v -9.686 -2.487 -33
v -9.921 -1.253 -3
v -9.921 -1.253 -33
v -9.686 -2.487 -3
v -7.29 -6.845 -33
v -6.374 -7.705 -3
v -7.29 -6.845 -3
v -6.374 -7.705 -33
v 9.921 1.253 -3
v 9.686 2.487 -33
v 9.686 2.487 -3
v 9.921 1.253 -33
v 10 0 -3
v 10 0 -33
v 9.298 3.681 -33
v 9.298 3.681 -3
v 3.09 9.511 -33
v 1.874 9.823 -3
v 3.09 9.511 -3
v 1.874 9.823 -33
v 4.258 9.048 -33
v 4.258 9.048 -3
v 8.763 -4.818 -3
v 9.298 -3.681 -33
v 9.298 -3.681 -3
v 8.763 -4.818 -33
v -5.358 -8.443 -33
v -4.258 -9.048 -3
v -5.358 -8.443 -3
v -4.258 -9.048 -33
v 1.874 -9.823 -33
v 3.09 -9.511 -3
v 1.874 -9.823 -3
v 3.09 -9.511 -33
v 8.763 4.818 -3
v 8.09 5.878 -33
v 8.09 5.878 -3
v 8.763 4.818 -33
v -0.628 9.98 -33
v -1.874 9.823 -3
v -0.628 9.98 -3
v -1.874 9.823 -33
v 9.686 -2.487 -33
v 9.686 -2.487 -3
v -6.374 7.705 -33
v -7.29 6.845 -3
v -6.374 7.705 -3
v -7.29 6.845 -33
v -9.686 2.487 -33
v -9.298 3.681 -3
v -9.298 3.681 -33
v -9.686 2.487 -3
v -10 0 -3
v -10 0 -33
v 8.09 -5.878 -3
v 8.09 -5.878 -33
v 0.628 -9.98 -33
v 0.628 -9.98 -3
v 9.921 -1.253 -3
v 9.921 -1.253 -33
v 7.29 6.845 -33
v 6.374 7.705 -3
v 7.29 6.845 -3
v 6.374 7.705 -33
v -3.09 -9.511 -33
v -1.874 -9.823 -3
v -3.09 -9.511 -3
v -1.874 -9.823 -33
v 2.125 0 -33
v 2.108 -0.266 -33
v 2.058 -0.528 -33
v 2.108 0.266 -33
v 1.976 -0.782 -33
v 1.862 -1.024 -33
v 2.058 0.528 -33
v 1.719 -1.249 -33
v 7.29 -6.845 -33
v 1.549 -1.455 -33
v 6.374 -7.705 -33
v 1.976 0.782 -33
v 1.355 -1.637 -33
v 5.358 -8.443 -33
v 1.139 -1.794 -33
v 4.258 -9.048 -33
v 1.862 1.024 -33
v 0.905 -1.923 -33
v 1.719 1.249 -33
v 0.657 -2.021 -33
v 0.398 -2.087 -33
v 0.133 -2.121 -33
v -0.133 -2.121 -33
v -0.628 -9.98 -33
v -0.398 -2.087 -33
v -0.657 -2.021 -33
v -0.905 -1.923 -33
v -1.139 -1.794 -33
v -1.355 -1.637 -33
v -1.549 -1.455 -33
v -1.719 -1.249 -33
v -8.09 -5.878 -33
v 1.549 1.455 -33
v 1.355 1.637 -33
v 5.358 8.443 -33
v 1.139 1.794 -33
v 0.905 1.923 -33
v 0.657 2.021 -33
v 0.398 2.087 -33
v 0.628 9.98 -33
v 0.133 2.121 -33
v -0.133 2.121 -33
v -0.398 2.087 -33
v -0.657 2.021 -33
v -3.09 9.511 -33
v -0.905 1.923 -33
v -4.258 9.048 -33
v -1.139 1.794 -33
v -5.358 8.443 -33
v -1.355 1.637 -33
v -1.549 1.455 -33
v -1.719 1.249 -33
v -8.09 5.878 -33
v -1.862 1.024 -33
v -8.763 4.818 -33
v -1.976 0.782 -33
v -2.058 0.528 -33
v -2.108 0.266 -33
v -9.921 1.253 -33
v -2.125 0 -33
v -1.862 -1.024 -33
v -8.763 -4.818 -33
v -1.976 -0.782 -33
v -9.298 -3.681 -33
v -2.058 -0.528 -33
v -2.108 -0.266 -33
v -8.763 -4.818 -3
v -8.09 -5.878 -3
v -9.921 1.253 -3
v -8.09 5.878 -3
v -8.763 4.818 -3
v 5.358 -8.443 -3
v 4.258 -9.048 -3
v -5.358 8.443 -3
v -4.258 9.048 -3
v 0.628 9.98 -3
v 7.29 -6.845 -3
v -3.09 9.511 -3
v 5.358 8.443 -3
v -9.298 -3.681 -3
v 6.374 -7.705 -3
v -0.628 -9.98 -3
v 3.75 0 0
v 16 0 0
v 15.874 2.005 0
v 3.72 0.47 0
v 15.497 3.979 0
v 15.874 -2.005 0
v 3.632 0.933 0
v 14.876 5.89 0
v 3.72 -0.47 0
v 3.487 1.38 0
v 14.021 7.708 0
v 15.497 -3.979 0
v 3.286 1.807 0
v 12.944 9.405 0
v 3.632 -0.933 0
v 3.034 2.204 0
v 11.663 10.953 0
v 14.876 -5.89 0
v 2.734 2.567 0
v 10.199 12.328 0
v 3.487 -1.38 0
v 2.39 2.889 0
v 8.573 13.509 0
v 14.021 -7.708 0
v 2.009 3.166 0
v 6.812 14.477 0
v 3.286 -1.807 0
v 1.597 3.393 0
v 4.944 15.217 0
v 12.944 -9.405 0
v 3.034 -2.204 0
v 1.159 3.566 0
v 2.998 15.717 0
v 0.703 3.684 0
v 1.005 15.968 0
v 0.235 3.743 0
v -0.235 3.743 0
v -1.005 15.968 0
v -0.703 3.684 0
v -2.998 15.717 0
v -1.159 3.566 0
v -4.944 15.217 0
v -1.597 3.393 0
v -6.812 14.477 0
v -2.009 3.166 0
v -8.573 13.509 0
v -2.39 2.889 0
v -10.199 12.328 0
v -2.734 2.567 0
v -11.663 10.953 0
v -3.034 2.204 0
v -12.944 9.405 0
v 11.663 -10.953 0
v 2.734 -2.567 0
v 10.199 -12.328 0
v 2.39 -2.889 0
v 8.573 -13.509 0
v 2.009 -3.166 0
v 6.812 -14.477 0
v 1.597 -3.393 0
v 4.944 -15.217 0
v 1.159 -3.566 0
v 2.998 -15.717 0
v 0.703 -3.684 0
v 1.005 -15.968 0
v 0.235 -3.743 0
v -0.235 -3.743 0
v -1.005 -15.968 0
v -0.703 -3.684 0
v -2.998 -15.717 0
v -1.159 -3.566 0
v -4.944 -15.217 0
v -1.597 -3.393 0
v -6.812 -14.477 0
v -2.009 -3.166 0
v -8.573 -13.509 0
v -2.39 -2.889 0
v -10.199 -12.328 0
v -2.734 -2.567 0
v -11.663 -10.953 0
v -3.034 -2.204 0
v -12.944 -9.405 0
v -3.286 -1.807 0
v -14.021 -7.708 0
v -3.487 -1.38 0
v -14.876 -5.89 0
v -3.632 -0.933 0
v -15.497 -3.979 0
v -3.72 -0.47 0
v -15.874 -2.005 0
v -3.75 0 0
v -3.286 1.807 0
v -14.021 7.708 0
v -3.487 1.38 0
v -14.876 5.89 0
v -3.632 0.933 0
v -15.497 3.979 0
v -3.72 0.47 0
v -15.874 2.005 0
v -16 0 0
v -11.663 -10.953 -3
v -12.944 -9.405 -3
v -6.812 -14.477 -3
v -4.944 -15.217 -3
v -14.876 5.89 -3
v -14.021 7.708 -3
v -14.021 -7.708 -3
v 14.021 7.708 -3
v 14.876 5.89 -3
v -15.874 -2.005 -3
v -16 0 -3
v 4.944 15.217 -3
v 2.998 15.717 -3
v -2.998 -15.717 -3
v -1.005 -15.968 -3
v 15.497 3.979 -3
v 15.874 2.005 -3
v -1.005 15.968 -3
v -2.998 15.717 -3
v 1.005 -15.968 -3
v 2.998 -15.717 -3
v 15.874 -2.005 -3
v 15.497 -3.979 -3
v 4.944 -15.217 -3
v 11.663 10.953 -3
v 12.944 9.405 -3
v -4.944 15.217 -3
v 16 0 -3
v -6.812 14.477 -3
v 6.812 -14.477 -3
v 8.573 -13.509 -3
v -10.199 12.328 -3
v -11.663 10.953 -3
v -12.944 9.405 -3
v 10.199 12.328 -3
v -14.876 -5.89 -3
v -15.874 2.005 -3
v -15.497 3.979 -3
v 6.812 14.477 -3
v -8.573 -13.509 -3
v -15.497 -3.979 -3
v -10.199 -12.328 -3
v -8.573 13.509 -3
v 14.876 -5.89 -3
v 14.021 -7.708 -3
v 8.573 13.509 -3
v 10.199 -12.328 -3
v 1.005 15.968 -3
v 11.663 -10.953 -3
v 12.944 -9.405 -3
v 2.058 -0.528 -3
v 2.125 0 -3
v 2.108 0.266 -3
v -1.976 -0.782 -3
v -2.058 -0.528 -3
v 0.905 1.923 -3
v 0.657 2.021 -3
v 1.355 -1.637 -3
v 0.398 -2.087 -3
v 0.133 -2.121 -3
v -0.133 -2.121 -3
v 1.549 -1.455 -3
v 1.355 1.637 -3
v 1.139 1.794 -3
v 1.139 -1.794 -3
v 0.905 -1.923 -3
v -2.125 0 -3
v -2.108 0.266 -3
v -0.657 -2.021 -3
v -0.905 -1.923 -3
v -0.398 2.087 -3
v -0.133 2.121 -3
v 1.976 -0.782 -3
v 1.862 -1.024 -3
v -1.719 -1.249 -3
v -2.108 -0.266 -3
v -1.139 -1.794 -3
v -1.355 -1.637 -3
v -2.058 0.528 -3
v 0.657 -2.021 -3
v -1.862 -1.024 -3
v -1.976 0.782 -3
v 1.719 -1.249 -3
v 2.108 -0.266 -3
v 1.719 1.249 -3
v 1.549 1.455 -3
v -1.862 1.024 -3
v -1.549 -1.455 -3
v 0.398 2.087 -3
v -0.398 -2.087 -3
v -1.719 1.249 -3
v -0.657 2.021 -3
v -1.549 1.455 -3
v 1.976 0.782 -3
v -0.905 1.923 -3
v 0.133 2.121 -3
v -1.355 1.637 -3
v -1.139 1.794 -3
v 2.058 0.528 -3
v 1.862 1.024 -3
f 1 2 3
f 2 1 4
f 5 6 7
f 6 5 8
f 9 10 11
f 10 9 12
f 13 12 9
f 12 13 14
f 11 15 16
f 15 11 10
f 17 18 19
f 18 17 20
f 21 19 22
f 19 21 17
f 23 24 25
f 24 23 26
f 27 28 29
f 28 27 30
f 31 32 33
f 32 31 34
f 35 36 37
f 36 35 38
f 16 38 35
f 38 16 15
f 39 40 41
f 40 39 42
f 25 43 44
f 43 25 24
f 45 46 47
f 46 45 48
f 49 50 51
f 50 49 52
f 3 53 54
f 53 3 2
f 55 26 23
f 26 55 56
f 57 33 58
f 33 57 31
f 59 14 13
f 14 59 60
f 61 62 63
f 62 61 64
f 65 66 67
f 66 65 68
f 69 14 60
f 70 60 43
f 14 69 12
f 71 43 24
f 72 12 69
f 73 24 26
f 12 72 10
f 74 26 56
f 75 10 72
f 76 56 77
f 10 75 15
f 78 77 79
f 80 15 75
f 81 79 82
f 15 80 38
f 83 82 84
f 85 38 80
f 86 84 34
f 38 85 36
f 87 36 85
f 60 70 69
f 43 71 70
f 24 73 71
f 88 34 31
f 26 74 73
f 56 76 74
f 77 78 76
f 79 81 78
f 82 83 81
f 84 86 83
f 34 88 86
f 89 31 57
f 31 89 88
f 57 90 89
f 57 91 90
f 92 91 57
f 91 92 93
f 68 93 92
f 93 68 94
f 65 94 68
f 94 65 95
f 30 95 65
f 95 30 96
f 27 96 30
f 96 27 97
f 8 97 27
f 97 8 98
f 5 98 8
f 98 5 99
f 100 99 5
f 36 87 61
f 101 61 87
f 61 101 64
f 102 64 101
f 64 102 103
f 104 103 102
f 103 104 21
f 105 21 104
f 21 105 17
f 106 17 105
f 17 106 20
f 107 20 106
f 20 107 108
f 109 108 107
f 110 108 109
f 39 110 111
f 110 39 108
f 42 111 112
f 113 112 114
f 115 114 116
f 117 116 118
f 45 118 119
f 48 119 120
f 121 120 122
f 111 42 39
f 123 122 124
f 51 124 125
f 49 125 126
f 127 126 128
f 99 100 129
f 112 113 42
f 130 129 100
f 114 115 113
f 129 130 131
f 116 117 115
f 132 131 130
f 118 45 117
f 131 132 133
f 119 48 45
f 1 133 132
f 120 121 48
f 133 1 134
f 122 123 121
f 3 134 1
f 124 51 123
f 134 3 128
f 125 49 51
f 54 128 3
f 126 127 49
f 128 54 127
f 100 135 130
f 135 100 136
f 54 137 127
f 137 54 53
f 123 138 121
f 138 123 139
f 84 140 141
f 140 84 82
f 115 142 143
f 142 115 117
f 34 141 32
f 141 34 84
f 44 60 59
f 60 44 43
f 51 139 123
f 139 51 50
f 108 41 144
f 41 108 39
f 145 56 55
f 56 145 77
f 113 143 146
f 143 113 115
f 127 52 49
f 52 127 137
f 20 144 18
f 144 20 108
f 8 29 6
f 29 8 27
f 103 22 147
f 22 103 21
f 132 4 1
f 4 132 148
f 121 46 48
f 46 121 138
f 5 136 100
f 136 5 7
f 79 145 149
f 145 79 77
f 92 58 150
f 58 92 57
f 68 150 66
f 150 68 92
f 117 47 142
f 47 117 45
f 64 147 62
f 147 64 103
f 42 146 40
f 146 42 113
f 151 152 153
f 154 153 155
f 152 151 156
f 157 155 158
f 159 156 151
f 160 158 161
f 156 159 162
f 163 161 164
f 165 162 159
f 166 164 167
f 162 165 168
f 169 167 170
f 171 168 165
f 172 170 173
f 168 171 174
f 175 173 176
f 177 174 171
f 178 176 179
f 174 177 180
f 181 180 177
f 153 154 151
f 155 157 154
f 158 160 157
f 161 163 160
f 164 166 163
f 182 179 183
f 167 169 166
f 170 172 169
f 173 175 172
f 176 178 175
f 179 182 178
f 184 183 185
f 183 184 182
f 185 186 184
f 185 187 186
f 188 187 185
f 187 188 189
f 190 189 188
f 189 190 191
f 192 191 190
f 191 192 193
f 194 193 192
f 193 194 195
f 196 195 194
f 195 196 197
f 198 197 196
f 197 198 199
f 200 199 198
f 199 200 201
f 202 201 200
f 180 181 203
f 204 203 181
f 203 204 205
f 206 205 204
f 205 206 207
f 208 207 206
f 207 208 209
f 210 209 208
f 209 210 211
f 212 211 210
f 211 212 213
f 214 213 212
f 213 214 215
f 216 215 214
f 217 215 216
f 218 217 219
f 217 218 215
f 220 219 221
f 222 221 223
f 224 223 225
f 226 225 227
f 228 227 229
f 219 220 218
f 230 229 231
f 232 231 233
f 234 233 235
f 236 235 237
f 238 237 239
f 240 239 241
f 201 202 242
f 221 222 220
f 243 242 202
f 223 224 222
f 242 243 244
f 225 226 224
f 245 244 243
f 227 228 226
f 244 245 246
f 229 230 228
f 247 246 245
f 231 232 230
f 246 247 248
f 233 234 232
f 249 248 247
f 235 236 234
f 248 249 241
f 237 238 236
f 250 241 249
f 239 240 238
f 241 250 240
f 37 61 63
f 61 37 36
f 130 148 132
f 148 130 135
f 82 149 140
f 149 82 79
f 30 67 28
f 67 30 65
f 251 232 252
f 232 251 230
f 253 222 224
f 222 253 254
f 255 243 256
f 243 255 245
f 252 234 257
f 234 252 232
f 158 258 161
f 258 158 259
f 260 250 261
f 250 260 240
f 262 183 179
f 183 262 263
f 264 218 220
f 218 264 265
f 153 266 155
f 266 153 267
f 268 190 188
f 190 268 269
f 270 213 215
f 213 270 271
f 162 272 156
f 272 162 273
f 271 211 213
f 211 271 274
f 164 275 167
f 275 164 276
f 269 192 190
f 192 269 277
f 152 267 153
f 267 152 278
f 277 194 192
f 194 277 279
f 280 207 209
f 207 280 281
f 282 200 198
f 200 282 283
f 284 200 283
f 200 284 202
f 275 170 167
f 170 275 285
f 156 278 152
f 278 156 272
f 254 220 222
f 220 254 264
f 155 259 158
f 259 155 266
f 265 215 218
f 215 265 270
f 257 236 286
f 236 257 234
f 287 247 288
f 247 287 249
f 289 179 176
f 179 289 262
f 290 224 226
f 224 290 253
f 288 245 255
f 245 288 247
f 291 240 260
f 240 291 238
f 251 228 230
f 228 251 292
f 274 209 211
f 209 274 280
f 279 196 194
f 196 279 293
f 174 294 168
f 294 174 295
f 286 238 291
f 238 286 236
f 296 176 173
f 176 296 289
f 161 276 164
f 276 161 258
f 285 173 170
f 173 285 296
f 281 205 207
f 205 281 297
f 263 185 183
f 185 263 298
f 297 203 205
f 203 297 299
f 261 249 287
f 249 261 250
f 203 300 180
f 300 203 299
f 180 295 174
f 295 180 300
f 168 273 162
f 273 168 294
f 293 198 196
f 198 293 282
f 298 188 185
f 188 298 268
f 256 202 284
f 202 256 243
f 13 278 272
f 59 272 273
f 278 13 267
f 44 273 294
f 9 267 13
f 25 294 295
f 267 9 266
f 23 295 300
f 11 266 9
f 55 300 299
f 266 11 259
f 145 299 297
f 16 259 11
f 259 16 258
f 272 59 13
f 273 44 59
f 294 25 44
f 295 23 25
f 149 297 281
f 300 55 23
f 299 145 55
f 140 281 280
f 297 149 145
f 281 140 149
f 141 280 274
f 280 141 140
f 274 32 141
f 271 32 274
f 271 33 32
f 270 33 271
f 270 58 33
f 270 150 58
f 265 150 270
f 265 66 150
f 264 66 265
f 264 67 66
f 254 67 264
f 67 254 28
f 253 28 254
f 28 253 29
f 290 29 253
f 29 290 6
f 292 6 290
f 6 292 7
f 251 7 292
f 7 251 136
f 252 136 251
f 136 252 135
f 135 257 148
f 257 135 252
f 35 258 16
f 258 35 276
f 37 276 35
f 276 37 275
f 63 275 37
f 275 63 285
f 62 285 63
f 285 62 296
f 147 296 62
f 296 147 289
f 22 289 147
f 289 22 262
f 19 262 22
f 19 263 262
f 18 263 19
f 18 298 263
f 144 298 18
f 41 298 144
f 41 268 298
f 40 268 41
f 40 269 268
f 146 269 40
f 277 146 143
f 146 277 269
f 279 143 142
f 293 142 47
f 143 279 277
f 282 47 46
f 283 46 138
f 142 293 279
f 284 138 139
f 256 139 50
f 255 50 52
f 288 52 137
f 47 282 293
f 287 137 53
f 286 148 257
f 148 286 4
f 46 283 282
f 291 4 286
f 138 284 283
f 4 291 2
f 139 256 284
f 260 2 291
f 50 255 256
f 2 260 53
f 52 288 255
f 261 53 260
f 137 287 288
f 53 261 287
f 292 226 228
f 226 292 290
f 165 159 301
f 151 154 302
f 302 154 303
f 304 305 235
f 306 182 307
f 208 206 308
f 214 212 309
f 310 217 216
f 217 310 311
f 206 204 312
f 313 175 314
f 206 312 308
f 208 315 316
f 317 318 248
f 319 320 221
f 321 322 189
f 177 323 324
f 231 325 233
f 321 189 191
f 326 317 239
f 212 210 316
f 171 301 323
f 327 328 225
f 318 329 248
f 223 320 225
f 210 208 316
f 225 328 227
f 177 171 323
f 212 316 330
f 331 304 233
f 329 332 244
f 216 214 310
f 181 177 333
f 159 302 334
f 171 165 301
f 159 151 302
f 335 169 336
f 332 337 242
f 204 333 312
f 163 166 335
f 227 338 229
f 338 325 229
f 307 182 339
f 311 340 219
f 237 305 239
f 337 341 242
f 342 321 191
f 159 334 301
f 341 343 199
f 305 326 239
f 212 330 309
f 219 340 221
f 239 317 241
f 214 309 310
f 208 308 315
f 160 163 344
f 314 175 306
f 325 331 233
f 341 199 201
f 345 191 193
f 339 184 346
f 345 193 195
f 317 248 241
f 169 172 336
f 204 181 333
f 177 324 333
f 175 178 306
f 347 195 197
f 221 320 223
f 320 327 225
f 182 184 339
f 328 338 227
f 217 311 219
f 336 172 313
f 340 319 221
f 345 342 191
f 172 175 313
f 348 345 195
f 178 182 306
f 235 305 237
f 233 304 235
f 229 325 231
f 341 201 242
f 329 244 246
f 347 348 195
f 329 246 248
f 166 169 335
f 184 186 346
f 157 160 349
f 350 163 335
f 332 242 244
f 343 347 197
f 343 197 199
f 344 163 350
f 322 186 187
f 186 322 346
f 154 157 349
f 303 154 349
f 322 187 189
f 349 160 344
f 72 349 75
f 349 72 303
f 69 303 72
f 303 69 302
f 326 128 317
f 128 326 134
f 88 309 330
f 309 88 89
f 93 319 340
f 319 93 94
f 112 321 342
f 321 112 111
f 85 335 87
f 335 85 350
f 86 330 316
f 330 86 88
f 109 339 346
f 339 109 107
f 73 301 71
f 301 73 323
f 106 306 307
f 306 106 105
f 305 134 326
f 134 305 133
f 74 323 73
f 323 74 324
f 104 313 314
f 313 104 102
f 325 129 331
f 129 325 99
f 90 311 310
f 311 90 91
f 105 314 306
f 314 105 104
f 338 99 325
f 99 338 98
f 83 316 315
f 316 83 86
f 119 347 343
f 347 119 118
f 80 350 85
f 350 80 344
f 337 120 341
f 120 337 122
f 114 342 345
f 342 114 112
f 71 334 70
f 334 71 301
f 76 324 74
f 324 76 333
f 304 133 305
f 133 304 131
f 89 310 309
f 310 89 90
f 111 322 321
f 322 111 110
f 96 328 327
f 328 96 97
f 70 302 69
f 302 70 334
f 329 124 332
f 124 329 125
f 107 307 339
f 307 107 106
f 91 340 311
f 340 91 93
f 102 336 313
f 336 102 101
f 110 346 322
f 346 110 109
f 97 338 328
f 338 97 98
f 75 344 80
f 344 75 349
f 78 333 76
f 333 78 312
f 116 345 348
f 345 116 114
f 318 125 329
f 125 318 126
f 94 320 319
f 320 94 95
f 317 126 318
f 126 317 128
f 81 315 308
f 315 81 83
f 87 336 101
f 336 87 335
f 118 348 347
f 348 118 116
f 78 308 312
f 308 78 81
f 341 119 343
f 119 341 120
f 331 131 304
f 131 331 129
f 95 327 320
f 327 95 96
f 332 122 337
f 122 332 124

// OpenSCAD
$fn = 50;


difference() {
	union() {
		translate(v = [0, 0, -33.0000000000]) {
			cylinder(h = 33, r = 10.0000000000);
		}
		translate(v = [0, 0, -3.0000000000]) {
			cylinder(h = 3, r = 16.0000000000);
		}
	}
	union() {
		translate(v = [0, 0, 0]) {
			rotate(a = [0, 0, 0]) {
				difference() {
					union() {
						#translate(v = [0, 0, -33.0000000000]) {
							cylinder(h = 33, r = 2.0000000000);
						}
						#translate(v = [0, 0, -3]) {
							cylinder(h = 3, r = 10.0000000000, r1 = 2.1250000000, r2 = 3.7500000000);
						}
						#translate(v = [0, 0, -33.0000000000]) {
							cylinder(h = 33, r = 2.1250000000);
						}
						#translate(v = [0, 0, -33.0000000000]) {
							cylinder(h = 33, r = 2.0000000000);
						}
					}
					union();
				}
			}
		}
	}
}
